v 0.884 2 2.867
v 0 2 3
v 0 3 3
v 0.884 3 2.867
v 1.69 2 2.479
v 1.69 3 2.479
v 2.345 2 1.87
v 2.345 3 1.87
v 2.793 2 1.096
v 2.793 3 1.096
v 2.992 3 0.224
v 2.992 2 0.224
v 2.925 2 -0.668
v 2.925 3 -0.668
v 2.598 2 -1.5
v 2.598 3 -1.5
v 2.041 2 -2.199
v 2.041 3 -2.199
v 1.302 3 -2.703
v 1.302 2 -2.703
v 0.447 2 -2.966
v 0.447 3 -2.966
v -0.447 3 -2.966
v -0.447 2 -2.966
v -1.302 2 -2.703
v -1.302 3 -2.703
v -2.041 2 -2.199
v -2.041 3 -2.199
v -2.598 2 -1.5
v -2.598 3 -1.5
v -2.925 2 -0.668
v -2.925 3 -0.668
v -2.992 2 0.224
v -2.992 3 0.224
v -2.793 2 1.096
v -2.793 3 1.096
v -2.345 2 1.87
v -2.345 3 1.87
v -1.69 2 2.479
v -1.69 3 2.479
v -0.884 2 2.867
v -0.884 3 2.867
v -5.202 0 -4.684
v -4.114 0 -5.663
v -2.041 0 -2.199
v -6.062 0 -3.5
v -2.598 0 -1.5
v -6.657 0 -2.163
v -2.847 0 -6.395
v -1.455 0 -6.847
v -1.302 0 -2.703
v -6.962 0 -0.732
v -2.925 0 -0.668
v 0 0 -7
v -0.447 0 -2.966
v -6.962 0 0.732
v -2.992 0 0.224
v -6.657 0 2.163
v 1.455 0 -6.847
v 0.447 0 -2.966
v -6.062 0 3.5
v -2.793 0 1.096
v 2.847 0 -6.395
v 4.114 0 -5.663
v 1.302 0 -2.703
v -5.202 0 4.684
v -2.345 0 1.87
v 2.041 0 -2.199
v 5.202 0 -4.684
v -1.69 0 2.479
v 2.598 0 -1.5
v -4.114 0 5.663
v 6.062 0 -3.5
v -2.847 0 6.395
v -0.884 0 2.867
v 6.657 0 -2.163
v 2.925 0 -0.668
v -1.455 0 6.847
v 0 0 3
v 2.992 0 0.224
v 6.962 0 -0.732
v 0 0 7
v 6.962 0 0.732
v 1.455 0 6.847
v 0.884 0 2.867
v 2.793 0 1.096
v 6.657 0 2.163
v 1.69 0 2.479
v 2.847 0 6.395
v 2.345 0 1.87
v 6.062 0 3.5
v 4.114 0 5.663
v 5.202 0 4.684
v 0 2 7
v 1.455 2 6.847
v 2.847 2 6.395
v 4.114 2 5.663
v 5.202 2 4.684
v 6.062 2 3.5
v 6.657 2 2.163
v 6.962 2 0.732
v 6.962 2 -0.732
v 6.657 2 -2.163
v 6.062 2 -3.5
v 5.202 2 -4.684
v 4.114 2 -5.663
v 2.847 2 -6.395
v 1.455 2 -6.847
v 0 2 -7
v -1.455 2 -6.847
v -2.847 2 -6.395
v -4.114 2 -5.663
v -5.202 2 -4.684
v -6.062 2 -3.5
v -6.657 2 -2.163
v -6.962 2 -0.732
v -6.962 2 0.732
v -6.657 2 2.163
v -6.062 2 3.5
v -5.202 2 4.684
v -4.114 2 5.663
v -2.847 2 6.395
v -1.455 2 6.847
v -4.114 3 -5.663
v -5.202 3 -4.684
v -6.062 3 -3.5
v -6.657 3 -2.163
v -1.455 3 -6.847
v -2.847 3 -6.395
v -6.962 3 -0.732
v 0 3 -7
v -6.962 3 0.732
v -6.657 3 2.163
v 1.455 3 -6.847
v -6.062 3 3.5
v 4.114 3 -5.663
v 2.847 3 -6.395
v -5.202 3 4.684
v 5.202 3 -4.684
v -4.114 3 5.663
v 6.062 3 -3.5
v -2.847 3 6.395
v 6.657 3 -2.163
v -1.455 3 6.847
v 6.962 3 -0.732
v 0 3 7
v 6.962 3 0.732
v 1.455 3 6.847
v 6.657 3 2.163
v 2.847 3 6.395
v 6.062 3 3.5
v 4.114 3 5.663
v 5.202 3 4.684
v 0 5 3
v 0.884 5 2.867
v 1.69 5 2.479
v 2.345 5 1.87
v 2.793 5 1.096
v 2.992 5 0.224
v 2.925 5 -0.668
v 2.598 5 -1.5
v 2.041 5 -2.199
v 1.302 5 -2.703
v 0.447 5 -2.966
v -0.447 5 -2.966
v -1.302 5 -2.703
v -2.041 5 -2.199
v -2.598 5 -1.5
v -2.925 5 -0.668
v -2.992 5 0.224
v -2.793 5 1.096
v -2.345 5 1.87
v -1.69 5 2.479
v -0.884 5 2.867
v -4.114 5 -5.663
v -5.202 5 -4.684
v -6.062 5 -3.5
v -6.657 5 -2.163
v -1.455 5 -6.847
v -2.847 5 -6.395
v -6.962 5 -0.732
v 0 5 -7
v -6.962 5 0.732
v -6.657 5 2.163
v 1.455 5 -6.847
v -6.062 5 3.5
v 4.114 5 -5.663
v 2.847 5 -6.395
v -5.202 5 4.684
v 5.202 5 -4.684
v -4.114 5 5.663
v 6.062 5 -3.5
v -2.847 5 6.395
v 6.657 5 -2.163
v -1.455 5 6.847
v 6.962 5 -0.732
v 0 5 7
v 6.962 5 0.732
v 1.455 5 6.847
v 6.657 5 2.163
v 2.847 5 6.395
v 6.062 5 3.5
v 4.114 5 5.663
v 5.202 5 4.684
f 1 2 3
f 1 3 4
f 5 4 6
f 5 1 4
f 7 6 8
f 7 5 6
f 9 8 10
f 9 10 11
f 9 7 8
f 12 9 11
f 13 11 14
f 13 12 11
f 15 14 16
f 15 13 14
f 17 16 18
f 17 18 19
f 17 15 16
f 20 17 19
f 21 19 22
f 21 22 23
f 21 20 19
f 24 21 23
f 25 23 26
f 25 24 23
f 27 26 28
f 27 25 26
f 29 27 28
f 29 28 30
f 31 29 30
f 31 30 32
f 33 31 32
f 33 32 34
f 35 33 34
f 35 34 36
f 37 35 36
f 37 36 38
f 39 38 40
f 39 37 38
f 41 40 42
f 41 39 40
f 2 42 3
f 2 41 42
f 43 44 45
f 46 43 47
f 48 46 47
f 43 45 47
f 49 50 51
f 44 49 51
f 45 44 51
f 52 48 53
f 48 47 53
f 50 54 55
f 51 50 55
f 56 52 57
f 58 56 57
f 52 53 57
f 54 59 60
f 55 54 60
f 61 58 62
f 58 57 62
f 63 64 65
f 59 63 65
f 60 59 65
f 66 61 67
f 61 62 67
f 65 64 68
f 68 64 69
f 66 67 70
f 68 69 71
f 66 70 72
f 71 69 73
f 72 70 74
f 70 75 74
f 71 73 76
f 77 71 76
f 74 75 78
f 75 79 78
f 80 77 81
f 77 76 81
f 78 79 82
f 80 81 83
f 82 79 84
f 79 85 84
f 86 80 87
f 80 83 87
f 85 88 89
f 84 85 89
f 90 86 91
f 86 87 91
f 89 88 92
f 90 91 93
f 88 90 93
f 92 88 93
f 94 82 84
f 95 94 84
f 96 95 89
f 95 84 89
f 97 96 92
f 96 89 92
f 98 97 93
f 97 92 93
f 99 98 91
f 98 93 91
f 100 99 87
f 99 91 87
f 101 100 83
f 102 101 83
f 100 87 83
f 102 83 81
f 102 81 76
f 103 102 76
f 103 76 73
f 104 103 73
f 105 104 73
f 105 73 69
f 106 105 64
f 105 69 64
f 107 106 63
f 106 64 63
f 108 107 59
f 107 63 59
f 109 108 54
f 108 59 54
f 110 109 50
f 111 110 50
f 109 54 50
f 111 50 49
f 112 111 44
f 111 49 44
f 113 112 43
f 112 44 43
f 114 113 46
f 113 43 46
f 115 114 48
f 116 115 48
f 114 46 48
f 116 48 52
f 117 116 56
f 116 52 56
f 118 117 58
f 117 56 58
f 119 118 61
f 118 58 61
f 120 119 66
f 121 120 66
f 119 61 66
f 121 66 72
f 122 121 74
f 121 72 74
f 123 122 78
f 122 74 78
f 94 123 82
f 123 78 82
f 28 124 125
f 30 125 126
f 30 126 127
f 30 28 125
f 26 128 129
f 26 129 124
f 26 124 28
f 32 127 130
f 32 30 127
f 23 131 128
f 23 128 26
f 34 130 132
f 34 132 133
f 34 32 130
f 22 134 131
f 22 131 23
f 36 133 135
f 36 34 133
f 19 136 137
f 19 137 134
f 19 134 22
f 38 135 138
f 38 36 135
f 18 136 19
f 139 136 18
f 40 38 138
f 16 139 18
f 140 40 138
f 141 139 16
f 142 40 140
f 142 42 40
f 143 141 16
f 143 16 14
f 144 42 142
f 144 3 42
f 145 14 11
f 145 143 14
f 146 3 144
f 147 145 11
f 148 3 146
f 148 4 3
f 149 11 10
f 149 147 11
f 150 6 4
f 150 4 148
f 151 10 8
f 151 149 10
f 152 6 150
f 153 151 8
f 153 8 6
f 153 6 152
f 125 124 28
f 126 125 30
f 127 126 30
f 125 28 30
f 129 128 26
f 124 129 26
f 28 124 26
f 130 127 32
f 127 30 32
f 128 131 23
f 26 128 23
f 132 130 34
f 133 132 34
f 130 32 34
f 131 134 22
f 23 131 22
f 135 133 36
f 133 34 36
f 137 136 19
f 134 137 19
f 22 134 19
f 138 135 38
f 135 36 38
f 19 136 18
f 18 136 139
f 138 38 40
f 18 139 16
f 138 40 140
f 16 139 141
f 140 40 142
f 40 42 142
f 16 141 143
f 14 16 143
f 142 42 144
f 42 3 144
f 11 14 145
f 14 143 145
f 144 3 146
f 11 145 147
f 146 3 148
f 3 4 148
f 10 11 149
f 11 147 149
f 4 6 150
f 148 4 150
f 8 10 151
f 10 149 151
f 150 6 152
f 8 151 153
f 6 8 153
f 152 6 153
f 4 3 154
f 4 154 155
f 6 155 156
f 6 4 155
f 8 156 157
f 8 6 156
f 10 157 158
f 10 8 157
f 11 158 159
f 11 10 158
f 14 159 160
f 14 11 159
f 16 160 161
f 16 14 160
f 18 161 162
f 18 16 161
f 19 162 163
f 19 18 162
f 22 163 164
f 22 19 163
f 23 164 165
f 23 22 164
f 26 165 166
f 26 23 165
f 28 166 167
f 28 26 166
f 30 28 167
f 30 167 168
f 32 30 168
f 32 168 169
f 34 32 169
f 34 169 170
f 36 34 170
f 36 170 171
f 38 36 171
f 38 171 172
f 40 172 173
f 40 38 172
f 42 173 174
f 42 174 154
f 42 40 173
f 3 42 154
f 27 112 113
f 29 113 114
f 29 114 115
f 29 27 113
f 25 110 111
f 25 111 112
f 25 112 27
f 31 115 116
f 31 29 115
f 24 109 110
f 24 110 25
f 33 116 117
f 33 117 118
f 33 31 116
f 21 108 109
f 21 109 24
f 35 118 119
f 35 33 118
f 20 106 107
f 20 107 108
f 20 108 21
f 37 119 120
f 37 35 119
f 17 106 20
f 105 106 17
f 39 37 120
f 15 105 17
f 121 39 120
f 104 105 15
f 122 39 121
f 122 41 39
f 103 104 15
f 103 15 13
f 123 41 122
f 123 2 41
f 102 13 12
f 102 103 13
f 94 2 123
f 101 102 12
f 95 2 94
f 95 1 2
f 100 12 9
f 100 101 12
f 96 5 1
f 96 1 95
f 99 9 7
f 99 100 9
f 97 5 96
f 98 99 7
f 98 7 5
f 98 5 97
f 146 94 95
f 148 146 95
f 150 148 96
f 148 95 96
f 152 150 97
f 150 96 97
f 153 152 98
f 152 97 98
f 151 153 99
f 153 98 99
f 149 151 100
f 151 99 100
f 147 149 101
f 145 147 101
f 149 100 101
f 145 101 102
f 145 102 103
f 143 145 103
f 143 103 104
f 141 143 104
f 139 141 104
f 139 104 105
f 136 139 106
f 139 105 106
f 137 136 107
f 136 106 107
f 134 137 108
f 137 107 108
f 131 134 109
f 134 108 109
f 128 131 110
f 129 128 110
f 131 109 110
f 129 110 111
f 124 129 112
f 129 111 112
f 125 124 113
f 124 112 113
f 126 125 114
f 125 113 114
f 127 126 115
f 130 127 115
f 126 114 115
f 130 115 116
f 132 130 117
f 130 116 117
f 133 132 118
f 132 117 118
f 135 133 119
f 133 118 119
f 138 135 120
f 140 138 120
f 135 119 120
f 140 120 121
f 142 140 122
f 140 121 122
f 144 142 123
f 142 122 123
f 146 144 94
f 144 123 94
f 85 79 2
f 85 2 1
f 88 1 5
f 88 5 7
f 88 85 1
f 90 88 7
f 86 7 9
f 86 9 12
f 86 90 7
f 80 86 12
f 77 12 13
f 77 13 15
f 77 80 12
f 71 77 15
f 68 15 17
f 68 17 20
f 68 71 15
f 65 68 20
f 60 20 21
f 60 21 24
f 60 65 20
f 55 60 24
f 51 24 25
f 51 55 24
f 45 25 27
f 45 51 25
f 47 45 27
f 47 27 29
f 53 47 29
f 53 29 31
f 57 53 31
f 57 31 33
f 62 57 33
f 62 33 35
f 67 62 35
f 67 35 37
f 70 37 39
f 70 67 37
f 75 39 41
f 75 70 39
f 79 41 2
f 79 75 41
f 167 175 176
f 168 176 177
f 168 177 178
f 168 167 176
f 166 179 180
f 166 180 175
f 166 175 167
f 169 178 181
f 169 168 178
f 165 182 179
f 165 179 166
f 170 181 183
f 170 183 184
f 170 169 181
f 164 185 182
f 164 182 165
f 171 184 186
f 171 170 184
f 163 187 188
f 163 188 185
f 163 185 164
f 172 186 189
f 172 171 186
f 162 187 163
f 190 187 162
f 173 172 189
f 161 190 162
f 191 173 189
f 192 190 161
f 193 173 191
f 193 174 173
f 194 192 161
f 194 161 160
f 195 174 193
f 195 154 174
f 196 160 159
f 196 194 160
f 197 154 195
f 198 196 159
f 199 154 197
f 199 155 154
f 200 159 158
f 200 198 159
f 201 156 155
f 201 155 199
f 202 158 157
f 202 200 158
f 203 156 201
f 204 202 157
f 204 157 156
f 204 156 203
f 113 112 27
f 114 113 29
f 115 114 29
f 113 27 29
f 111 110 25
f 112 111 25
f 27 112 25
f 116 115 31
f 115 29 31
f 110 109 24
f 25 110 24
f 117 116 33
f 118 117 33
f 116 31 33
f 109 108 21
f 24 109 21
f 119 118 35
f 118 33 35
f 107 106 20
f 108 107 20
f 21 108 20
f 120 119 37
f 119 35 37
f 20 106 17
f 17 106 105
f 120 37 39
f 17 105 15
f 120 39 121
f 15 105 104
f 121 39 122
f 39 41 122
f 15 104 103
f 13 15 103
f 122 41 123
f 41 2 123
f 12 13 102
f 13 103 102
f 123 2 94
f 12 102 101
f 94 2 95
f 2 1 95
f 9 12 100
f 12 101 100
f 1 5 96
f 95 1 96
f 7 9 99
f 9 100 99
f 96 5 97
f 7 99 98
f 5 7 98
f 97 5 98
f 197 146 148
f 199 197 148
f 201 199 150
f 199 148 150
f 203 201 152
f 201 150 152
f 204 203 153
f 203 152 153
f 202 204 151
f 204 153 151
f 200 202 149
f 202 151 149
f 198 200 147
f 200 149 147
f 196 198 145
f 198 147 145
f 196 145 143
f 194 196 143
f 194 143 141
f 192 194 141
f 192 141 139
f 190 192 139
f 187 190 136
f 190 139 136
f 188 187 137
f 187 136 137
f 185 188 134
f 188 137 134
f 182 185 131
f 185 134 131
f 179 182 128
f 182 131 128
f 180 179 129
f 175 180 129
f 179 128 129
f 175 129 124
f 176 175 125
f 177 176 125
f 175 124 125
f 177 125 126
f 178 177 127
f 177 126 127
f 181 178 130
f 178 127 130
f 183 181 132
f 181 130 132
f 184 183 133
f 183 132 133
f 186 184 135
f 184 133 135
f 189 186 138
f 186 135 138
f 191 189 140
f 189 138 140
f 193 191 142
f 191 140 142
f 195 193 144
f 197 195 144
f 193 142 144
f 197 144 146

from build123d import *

# Parameters (mm, degrees)
SKETCH_1_R      = 7
SKETCH_1_R_2    = 3
EXTRUDE_1_DEPTH = 2
SKETCH_2_R      = 7
SKETCH_2_R_2    = 3
EXTRUDE_2_DEPTH = 1
SKETCH_3_R      = 7
SKETCH_3_R_2    = 3
EXTRUDE_3_DEPTH = 2


with BuildPart() as part:
    # 草图1 → 凸台-拉伸1 (new body)
    with BuildSketch(Plane(origin=(0, 0, 0), x_dir=(1, 0, 0), z_dir=(0, 1, 0))):
        with Locations(Location((0, 0, 0), (0, 0, 270))):
            Circle(SKETCH_1_R)
        with Locations(Location((0, 0, 0), (0, 0, 270))):
            Circle(SKETCH_1_R_2, mode=Mode.SUBTRACT)
    extrude(amount=EXTRUDE_1_DEPTH)


with BuildPart() as body_2:
    # 草图2 → 凸台-拉伸2 (new body)
    with BuildSketch(Plane(origin=(0, 2, 0), x_dir=(1, 0, 0), z_dir=(0, 1, 0))):
        with Locations(Location((0, 0, 0), (0, 0, 270))):
            Circle(SKETCH_2_R)
        with Locations(Location((0, 0, 0), (0, 0, 270))):
            Circle(SKETCH_2_R_2, mode=Mode.SUBTRACT)
    extrude(amount=EXTRUDE_2_DEPTH)


with BuildPart() as body_3:
    # 草图3 → 凸台-拉伸3 (new body)
    with BuildSketch(Plane(origin=(0, 3, 0), x_dir=(1, 0, 0), z_dir=(0, 1, 0))):
        with Locations(Location((0, 0, 0), (0, 0, 270))):
            Circle(SKETCH_3_R)
        with Locations(Location((0, 0, 0), (0, 0, 270))):
            Circle(SKETCH_3_R_2, mode=Mode.SUBTRACT)
    extrude(amount=EXTRUDE_3_DEPTH)


solid = Compound([part.part, body_2.part, body_3.part])
